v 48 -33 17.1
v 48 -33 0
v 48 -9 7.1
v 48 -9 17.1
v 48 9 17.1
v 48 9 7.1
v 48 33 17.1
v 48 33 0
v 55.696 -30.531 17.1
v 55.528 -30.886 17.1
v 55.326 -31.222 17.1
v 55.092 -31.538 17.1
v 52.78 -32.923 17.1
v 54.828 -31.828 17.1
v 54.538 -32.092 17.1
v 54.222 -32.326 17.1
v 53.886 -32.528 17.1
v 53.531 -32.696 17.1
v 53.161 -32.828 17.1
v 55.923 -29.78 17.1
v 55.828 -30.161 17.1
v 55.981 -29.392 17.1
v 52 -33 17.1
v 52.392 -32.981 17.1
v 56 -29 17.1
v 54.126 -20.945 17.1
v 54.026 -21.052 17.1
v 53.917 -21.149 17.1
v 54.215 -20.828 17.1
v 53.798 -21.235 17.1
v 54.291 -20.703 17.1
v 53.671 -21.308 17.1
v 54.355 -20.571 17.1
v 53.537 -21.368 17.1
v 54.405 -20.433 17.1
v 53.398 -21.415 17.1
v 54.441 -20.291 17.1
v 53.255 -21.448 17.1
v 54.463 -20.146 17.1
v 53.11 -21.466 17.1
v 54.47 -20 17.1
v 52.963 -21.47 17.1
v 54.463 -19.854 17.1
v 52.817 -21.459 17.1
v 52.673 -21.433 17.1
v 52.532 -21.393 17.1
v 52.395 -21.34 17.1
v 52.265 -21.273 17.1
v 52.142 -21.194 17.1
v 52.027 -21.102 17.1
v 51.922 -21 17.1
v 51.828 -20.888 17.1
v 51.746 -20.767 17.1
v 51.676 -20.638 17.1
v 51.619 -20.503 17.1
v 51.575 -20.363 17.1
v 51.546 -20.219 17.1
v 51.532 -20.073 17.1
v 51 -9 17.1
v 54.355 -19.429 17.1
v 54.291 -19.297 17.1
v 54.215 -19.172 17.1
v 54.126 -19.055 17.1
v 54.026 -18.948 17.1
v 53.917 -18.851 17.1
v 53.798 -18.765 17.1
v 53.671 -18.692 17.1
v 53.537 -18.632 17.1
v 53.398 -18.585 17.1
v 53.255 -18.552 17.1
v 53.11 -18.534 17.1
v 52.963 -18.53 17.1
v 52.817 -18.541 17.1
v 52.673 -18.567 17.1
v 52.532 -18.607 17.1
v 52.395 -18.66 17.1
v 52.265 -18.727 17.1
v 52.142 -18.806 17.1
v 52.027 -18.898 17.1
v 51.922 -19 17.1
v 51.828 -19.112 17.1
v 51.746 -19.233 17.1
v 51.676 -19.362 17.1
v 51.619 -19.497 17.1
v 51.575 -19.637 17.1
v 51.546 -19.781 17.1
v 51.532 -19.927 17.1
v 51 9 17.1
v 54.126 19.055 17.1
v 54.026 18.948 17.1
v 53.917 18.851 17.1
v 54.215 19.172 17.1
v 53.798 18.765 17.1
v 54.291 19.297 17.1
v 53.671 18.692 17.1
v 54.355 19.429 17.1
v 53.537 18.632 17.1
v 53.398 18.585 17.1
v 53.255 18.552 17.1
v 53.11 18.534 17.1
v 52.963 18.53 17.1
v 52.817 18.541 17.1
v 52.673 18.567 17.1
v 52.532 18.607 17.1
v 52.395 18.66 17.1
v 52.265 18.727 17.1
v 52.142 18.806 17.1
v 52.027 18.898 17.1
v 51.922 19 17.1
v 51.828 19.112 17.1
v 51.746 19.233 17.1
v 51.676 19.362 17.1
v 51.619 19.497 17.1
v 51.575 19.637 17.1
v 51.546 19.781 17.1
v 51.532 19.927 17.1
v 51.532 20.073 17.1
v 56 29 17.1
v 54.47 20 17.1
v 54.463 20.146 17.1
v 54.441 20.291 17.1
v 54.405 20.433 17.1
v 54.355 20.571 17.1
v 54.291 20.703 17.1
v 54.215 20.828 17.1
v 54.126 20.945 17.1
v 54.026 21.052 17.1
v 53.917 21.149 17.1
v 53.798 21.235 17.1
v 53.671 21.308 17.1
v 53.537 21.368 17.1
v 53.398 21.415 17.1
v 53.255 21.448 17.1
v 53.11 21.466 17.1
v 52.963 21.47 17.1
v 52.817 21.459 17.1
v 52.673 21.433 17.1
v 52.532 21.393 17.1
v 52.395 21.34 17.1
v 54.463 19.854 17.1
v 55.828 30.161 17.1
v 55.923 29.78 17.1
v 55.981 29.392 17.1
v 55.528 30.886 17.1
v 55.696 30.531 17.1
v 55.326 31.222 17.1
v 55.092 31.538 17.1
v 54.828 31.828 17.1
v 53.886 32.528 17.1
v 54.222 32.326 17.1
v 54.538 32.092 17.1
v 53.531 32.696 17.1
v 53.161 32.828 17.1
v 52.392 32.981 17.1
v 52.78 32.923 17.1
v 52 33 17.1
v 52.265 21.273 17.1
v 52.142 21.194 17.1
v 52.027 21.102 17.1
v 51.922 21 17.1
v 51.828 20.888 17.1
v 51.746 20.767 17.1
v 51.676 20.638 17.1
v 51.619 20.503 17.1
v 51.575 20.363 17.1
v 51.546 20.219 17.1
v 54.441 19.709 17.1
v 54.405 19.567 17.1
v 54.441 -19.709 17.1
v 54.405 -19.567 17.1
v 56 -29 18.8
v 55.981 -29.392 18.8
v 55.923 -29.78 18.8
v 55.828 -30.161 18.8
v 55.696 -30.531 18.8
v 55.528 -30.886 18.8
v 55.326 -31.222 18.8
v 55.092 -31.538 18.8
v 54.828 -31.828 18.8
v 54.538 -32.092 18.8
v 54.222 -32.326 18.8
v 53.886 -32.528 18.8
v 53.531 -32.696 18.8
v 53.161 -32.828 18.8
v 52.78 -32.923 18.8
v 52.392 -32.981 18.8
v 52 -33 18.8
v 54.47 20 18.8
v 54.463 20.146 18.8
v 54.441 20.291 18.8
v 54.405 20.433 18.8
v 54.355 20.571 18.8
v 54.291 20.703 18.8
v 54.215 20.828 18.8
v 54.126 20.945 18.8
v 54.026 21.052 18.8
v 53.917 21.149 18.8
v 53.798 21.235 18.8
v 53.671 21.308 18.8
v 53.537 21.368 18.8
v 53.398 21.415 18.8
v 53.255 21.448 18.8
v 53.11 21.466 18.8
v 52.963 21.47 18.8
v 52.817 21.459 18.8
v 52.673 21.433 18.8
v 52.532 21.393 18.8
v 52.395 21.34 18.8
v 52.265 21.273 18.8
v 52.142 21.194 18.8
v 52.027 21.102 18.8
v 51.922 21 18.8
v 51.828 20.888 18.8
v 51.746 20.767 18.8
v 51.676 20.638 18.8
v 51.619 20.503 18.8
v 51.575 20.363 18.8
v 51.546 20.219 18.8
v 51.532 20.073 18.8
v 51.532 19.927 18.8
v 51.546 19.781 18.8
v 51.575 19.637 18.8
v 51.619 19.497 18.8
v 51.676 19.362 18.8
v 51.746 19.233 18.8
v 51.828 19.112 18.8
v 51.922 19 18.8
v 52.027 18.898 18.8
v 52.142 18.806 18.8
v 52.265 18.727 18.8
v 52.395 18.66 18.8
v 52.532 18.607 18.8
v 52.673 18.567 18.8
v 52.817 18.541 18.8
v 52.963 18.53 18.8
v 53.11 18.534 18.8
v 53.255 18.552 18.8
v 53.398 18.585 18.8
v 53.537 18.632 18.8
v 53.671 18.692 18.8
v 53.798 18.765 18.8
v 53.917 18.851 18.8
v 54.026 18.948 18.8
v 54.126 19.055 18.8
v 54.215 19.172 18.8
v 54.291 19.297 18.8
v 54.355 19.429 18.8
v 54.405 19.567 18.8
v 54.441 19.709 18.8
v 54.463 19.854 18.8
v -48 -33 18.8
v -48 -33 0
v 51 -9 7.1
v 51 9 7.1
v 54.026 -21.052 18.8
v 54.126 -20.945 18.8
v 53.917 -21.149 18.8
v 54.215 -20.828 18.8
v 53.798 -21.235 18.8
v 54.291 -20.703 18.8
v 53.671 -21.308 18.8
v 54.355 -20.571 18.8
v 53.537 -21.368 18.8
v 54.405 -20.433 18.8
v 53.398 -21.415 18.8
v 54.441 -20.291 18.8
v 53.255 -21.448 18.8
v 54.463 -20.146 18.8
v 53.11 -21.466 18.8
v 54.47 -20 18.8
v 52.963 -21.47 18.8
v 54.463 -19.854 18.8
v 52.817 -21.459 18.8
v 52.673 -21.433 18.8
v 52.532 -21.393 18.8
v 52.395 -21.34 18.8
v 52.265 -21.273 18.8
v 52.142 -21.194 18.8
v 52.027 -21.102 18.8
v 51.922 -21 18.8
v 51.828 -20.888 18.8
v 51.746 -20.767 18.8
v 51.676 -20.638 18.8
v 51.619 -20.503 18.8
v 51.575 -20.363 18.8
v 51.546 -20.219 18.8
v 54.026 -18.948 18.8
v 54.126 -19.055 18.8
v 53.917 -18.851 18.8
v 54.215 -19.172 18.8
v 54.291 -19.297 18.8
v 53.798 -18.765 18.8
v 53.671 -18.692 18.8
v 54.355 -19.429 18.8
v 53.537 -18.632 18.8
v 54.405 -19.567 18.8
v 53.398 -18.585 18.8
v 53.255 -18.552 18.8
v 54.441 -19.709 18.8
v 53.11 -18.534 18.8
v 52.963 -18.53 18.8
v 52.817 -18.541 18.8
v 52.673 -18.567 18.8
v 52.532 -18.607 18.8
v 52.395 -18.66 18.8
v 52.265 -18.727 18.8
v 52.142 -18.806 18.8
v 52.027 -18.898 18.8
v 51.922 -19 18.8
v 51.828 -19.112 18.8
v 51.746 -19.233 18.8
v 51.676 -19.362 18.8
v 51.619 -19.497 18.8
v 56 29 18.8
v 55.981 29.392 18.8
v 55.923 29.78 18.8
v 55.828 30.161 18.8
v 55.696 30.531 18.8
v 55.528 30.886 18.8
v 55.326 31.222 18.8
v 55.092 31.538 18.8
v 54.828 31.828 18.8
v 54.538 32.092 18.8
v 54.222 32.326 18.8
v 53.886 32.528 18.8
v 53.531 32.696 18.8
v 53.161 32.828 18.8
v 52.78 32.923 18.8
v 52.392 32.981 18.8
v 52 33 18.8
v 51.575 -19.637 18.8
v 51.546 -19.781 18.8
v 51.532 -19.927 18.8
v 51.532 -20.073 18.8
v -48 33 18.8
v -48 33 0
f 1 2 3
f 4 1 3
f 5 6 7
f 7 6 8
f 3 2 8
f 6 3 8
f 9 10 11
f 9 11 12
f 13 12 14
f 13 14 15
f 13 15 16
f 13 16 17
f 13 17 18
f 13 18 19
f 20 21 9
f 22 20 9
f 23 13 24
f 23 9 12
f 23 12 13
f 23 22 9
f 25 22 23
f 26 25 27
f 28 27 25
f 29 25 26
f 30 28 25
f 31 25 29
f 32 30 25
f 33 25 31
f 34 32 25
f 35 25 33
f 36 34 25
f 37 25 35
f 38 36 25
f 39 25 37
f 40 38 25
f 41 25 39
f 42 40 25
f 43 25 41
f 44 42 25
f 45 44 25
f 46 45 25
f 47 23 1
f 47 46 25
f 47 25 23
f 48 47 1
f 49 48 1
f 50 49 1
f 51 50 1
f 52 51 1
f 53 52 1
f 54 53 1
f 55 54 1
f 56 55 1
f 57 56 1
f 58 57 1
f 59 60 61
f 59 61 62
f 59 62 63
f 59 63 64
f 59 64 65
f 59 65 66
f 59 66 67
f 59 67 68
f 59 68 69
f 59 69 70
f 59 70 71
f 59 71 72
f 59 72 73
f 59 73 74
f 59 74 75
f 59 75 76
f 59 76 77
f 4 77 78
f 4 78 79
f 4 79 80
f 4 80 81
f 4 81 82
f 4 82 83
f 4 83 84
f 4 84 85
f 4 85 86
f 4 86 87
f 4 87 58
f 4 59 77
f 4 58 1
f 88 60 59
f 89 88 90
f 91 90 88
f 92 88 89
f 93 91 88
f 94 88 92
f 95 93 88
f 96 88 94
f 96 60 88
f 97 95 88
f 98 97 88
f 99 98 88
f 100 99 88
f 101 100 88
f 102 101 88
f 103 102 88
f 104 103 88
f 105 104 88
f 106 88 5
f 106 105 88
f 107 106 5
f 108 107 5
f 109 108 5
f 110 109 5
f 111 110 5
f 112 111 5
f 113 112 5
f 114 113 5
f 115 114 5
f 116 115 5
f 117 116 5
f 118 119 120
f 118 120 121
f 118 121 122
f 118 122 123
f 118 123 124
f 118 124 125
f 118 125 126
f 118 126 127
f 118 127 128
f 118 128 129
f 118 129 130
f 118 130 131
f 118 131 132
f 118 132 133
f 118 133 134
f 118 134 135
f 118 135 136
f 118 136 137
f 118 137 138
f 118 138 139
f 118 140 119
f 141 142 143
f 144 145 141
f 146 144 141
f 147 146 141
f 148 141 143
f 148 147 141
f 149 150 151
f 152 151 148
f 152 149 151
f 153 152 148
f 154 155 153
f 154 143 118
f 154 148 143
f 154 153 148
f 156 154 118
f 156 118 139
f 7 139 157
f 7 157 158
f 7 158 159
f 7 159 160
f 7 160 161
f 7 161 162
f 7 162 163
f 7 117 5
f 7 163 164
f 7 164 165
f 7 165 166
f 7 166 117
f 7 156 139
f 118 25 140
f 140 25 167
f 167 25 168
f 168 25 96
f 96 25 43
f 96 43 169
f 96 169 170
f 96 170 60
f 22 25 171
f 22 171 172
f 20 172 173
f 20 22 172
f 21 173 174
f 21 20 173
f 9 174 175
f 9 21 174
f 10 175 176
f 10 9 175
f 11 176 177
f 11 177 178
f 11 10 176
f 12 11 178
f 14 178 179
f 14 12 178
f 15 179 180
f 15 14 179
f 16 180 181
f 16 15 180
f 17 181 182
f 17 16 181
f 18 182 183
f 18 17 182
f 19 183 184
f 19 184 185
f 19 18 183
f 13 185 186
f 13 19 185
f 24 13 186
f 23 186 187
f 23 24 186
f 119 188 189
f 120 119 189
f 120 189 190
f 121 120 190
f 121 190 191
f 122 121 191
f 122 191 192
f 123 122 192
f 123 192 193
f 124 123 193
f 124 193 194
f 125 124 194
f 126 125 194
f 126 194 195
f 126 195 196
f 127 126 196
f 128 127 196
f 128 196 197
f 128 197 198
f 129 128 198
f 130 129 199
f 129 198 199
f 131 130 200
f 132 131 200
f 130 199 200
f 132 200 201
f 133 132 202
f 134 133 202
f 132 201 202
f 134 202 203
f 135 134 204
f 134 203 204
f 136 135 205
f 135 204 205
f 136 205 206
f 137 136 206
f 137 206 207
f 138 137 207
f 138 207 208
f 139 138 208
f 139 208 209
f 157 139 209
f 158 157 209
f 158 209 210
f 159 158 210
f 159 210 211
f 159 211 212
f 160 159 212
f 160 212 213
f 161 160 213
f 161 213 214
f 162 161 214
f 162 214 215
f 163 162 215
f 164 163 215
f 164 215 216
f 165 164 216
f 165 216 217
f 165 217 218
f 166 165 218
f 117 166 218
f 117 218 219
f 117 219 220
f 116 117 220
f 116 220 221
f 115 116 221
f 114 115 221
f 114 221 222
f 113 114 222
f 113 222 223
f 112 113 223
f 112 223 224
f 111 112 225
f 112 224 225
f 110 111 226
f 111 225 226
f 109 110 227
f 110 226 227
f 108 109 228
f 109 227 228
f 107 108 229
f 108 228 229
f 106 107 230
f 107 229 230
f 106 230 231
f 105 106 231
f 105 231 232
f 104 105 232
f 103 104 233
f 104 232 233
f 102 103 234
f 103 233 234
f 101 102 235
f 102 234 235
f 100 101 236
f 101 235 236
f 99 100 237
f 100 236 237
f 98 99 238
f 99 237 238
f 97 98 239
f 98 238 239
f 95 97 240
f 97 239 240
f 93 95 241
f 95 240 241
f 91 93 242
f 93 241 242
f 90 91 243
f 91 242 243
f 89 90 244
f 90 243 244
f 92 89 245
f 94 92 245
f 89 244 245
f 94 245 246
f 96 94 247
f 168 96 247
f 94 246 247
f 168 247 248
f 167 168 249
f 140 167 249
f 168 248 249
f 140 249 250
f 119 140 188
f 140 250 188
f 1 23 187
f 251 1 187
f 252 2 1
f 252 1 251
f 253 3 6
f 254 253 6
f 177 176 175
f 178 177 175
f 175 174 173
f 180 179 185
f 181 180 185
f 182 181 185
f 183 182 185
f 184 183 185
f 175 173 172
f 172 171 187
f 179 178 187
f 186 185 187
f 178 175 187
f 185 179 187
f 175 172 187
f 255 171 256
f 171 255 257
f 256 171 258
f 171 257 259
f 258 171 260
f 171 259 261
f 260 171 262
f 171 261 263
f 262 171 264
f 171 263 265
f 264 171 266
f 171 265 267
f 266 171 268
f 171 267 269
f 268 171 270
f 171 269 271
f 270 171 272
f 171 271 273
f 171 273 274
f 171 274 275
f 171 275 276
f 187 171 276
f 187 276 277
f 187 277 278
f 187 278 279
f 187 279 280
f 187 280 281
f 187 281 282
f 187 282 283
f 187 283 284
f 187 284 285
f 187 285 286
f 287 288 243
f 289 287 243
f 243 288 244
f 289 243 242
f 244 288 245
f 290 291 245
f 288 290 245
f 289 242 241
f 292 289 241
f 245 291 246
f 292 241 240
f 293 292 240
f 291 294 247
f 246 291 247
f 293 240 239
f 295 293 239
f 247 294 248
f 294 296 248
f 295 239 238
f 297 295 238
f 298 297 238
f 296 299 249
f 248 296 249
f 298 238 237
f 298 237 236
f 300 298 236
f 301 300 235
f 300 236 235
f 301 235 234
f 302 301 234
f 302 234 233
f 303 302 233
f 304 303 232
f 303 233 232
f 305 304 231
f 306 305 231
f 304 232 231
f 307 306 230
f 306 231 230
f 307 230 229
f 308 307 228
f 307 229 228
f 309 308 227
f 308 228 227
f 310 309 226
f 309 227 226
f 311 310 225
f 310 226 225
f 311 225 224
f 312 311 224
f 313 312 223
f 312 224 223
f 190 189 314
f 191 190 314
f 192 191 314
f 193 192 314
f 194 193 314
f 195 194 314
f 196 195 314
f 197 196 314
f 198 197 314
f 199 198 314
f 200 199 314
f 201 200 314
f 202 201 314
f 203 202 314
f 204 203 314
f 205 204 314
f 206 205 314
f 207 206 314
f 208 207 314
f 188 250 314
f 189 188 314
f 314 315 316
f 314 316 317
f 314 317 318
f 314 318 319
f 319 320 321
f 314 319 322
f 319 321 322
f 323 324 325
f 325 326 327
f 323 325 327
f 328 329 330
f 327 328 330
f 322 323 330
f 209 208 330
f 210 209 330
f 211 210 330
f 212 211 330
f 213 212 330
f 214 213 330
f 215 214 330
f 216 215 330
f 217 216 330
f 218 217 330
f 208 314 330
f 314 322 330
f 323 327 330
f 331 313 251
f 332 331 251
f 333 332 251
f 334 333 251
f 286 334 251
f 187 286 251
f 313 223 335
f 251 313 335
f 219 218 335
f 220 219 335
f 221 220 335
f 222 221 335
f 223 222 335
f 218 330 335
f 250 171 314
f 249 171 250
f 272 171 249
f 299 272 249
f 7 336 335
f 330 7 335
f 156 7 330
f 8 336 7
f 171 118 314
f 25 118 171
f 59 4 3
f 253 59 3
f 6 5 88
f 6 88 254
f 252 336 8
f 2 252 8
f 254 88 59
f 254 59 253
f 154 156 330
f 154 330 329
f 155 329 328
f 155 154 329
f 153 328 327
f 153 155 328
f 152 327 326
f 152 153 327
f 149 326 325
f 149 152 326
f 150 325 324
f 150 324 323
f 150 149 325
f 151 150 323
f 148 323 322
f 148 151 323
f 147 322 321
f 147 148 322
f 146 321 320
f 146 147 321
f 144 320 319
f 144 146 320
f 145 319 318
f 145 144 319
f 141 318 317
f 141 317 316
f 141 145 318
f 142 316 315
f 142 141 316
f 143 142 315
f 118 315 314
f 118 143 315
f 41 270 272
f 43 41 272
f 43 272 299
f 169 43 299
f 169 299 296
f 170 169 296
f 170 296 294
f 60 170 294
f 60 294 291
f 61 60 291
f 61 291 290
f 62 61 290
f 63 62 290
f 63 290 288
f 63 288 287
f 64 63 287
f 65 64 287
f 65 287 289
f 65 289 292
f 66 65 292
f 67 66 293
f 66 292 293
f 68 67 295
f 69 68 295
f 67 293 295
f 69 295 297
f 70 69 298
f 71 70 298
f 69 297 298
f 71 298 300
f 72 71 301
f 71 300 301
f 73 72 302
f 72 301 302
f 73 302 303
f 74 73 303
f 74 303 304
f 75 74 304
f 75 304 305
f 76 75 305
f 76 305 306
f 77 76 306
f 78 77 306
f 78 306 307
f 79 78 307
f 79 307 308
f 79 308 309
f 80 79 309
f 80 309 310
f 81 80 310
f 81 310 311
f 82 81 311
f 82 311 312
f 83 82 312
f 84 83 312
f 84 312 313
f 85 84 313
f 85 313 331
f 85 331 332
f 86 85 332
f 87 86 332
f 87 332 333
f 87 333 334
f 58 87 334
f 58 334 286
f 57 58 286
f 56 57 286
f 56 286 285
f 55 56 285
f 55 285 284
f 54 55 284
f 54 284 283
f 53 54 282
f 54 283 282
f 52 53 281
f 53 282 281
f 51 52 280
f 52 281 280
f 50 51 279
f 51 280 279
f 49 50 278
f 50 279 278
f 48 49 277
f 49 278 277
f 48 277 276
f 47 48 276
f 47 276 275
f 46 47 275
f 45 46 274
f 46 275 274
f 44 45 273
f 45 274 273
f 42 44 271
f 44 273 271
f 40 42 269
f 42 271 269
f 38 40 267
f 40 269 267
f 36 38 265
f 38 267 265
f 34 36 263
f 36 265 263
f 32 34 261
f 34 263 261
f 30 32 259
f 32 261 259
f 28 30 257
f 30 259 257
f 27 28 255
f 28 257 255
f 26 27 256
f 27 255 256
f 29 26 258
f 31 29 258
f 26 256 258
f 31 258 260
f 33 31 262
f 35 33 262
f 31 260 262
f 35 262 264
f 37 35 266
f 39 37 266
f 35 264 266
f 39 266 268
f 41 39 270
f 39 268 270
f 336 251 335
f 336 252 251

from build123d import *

# Parameters (mm, degrees)
SKETCH1_W           = 96
SKETCH1_H           = 66
BOSS_EXTRUDE1_DEPTH = 17.1
BOSS_EXTRUDE2_DEPTH = 1.7
SKETCH3_W           = 10
SKETCH3_H           = 18
BOSS_EXTRUDE3_DEPTH = 3
SKETCH4_R           = 1.47
CUT_EXTRUDE1_DEPTH  = 19.8


with BuildPart() as part:
    # Sketch1 → Boss-Extrude1 (new body)
    with BuildSketch(Plane.XY):
        Rectangle(SKETCH1_W, SKETCH1_H)
    extrude(amount=BOSS_EXTRUDE1_DEPTH)

    # Sketch2 → Boss-Extrude2 (add)
    with BuildSketch(Plane.XY.offset(17.1)):
        with BuildLine():
            Line((-48, 33), (52, 33))
            ThreePointArc((52, 33), (54.828427125, 31.828427125), (56, 29))
            Line((56, 29), (56, -29))
            ThreePointArc((56, -29), (54.828427125, -31.828427125), (52, -33))
            Line((52, -33), (-48, -33))
            Line((-48, -33), (-48, 33))
        make_face()
    extrude(amount=BOSS_EXTRUDE2_DEPTH)

    # Sketch3 → Boss-Extrude3 (add)
    with BuildSketch(Plane(origin=(48, 0, 0), x_dir=(0, 0, -1), z_dir=(1, 0, 0))):
        with Locations((-12.1, 0)):
            Rectangle(SKETCH3_W, SKETCH3_H)
    extrude(amount=BOSS_EXTRUDE3_DEPTH)

    # Sketch4 → Cut-Extrude1 (cut, through all)
    with BuildSketch(Plane.XY.offset(18.8)):
        with Locations((53, 20)):
            Circle(SKETCH4_R)
        with Locations((53, -20)):
            Circle(SKETCH4_R)
    extrude(amount=-CUT_EXTRUDE1_DEPTH, mode=Mode.SUBTRACT)


solid = part.part
